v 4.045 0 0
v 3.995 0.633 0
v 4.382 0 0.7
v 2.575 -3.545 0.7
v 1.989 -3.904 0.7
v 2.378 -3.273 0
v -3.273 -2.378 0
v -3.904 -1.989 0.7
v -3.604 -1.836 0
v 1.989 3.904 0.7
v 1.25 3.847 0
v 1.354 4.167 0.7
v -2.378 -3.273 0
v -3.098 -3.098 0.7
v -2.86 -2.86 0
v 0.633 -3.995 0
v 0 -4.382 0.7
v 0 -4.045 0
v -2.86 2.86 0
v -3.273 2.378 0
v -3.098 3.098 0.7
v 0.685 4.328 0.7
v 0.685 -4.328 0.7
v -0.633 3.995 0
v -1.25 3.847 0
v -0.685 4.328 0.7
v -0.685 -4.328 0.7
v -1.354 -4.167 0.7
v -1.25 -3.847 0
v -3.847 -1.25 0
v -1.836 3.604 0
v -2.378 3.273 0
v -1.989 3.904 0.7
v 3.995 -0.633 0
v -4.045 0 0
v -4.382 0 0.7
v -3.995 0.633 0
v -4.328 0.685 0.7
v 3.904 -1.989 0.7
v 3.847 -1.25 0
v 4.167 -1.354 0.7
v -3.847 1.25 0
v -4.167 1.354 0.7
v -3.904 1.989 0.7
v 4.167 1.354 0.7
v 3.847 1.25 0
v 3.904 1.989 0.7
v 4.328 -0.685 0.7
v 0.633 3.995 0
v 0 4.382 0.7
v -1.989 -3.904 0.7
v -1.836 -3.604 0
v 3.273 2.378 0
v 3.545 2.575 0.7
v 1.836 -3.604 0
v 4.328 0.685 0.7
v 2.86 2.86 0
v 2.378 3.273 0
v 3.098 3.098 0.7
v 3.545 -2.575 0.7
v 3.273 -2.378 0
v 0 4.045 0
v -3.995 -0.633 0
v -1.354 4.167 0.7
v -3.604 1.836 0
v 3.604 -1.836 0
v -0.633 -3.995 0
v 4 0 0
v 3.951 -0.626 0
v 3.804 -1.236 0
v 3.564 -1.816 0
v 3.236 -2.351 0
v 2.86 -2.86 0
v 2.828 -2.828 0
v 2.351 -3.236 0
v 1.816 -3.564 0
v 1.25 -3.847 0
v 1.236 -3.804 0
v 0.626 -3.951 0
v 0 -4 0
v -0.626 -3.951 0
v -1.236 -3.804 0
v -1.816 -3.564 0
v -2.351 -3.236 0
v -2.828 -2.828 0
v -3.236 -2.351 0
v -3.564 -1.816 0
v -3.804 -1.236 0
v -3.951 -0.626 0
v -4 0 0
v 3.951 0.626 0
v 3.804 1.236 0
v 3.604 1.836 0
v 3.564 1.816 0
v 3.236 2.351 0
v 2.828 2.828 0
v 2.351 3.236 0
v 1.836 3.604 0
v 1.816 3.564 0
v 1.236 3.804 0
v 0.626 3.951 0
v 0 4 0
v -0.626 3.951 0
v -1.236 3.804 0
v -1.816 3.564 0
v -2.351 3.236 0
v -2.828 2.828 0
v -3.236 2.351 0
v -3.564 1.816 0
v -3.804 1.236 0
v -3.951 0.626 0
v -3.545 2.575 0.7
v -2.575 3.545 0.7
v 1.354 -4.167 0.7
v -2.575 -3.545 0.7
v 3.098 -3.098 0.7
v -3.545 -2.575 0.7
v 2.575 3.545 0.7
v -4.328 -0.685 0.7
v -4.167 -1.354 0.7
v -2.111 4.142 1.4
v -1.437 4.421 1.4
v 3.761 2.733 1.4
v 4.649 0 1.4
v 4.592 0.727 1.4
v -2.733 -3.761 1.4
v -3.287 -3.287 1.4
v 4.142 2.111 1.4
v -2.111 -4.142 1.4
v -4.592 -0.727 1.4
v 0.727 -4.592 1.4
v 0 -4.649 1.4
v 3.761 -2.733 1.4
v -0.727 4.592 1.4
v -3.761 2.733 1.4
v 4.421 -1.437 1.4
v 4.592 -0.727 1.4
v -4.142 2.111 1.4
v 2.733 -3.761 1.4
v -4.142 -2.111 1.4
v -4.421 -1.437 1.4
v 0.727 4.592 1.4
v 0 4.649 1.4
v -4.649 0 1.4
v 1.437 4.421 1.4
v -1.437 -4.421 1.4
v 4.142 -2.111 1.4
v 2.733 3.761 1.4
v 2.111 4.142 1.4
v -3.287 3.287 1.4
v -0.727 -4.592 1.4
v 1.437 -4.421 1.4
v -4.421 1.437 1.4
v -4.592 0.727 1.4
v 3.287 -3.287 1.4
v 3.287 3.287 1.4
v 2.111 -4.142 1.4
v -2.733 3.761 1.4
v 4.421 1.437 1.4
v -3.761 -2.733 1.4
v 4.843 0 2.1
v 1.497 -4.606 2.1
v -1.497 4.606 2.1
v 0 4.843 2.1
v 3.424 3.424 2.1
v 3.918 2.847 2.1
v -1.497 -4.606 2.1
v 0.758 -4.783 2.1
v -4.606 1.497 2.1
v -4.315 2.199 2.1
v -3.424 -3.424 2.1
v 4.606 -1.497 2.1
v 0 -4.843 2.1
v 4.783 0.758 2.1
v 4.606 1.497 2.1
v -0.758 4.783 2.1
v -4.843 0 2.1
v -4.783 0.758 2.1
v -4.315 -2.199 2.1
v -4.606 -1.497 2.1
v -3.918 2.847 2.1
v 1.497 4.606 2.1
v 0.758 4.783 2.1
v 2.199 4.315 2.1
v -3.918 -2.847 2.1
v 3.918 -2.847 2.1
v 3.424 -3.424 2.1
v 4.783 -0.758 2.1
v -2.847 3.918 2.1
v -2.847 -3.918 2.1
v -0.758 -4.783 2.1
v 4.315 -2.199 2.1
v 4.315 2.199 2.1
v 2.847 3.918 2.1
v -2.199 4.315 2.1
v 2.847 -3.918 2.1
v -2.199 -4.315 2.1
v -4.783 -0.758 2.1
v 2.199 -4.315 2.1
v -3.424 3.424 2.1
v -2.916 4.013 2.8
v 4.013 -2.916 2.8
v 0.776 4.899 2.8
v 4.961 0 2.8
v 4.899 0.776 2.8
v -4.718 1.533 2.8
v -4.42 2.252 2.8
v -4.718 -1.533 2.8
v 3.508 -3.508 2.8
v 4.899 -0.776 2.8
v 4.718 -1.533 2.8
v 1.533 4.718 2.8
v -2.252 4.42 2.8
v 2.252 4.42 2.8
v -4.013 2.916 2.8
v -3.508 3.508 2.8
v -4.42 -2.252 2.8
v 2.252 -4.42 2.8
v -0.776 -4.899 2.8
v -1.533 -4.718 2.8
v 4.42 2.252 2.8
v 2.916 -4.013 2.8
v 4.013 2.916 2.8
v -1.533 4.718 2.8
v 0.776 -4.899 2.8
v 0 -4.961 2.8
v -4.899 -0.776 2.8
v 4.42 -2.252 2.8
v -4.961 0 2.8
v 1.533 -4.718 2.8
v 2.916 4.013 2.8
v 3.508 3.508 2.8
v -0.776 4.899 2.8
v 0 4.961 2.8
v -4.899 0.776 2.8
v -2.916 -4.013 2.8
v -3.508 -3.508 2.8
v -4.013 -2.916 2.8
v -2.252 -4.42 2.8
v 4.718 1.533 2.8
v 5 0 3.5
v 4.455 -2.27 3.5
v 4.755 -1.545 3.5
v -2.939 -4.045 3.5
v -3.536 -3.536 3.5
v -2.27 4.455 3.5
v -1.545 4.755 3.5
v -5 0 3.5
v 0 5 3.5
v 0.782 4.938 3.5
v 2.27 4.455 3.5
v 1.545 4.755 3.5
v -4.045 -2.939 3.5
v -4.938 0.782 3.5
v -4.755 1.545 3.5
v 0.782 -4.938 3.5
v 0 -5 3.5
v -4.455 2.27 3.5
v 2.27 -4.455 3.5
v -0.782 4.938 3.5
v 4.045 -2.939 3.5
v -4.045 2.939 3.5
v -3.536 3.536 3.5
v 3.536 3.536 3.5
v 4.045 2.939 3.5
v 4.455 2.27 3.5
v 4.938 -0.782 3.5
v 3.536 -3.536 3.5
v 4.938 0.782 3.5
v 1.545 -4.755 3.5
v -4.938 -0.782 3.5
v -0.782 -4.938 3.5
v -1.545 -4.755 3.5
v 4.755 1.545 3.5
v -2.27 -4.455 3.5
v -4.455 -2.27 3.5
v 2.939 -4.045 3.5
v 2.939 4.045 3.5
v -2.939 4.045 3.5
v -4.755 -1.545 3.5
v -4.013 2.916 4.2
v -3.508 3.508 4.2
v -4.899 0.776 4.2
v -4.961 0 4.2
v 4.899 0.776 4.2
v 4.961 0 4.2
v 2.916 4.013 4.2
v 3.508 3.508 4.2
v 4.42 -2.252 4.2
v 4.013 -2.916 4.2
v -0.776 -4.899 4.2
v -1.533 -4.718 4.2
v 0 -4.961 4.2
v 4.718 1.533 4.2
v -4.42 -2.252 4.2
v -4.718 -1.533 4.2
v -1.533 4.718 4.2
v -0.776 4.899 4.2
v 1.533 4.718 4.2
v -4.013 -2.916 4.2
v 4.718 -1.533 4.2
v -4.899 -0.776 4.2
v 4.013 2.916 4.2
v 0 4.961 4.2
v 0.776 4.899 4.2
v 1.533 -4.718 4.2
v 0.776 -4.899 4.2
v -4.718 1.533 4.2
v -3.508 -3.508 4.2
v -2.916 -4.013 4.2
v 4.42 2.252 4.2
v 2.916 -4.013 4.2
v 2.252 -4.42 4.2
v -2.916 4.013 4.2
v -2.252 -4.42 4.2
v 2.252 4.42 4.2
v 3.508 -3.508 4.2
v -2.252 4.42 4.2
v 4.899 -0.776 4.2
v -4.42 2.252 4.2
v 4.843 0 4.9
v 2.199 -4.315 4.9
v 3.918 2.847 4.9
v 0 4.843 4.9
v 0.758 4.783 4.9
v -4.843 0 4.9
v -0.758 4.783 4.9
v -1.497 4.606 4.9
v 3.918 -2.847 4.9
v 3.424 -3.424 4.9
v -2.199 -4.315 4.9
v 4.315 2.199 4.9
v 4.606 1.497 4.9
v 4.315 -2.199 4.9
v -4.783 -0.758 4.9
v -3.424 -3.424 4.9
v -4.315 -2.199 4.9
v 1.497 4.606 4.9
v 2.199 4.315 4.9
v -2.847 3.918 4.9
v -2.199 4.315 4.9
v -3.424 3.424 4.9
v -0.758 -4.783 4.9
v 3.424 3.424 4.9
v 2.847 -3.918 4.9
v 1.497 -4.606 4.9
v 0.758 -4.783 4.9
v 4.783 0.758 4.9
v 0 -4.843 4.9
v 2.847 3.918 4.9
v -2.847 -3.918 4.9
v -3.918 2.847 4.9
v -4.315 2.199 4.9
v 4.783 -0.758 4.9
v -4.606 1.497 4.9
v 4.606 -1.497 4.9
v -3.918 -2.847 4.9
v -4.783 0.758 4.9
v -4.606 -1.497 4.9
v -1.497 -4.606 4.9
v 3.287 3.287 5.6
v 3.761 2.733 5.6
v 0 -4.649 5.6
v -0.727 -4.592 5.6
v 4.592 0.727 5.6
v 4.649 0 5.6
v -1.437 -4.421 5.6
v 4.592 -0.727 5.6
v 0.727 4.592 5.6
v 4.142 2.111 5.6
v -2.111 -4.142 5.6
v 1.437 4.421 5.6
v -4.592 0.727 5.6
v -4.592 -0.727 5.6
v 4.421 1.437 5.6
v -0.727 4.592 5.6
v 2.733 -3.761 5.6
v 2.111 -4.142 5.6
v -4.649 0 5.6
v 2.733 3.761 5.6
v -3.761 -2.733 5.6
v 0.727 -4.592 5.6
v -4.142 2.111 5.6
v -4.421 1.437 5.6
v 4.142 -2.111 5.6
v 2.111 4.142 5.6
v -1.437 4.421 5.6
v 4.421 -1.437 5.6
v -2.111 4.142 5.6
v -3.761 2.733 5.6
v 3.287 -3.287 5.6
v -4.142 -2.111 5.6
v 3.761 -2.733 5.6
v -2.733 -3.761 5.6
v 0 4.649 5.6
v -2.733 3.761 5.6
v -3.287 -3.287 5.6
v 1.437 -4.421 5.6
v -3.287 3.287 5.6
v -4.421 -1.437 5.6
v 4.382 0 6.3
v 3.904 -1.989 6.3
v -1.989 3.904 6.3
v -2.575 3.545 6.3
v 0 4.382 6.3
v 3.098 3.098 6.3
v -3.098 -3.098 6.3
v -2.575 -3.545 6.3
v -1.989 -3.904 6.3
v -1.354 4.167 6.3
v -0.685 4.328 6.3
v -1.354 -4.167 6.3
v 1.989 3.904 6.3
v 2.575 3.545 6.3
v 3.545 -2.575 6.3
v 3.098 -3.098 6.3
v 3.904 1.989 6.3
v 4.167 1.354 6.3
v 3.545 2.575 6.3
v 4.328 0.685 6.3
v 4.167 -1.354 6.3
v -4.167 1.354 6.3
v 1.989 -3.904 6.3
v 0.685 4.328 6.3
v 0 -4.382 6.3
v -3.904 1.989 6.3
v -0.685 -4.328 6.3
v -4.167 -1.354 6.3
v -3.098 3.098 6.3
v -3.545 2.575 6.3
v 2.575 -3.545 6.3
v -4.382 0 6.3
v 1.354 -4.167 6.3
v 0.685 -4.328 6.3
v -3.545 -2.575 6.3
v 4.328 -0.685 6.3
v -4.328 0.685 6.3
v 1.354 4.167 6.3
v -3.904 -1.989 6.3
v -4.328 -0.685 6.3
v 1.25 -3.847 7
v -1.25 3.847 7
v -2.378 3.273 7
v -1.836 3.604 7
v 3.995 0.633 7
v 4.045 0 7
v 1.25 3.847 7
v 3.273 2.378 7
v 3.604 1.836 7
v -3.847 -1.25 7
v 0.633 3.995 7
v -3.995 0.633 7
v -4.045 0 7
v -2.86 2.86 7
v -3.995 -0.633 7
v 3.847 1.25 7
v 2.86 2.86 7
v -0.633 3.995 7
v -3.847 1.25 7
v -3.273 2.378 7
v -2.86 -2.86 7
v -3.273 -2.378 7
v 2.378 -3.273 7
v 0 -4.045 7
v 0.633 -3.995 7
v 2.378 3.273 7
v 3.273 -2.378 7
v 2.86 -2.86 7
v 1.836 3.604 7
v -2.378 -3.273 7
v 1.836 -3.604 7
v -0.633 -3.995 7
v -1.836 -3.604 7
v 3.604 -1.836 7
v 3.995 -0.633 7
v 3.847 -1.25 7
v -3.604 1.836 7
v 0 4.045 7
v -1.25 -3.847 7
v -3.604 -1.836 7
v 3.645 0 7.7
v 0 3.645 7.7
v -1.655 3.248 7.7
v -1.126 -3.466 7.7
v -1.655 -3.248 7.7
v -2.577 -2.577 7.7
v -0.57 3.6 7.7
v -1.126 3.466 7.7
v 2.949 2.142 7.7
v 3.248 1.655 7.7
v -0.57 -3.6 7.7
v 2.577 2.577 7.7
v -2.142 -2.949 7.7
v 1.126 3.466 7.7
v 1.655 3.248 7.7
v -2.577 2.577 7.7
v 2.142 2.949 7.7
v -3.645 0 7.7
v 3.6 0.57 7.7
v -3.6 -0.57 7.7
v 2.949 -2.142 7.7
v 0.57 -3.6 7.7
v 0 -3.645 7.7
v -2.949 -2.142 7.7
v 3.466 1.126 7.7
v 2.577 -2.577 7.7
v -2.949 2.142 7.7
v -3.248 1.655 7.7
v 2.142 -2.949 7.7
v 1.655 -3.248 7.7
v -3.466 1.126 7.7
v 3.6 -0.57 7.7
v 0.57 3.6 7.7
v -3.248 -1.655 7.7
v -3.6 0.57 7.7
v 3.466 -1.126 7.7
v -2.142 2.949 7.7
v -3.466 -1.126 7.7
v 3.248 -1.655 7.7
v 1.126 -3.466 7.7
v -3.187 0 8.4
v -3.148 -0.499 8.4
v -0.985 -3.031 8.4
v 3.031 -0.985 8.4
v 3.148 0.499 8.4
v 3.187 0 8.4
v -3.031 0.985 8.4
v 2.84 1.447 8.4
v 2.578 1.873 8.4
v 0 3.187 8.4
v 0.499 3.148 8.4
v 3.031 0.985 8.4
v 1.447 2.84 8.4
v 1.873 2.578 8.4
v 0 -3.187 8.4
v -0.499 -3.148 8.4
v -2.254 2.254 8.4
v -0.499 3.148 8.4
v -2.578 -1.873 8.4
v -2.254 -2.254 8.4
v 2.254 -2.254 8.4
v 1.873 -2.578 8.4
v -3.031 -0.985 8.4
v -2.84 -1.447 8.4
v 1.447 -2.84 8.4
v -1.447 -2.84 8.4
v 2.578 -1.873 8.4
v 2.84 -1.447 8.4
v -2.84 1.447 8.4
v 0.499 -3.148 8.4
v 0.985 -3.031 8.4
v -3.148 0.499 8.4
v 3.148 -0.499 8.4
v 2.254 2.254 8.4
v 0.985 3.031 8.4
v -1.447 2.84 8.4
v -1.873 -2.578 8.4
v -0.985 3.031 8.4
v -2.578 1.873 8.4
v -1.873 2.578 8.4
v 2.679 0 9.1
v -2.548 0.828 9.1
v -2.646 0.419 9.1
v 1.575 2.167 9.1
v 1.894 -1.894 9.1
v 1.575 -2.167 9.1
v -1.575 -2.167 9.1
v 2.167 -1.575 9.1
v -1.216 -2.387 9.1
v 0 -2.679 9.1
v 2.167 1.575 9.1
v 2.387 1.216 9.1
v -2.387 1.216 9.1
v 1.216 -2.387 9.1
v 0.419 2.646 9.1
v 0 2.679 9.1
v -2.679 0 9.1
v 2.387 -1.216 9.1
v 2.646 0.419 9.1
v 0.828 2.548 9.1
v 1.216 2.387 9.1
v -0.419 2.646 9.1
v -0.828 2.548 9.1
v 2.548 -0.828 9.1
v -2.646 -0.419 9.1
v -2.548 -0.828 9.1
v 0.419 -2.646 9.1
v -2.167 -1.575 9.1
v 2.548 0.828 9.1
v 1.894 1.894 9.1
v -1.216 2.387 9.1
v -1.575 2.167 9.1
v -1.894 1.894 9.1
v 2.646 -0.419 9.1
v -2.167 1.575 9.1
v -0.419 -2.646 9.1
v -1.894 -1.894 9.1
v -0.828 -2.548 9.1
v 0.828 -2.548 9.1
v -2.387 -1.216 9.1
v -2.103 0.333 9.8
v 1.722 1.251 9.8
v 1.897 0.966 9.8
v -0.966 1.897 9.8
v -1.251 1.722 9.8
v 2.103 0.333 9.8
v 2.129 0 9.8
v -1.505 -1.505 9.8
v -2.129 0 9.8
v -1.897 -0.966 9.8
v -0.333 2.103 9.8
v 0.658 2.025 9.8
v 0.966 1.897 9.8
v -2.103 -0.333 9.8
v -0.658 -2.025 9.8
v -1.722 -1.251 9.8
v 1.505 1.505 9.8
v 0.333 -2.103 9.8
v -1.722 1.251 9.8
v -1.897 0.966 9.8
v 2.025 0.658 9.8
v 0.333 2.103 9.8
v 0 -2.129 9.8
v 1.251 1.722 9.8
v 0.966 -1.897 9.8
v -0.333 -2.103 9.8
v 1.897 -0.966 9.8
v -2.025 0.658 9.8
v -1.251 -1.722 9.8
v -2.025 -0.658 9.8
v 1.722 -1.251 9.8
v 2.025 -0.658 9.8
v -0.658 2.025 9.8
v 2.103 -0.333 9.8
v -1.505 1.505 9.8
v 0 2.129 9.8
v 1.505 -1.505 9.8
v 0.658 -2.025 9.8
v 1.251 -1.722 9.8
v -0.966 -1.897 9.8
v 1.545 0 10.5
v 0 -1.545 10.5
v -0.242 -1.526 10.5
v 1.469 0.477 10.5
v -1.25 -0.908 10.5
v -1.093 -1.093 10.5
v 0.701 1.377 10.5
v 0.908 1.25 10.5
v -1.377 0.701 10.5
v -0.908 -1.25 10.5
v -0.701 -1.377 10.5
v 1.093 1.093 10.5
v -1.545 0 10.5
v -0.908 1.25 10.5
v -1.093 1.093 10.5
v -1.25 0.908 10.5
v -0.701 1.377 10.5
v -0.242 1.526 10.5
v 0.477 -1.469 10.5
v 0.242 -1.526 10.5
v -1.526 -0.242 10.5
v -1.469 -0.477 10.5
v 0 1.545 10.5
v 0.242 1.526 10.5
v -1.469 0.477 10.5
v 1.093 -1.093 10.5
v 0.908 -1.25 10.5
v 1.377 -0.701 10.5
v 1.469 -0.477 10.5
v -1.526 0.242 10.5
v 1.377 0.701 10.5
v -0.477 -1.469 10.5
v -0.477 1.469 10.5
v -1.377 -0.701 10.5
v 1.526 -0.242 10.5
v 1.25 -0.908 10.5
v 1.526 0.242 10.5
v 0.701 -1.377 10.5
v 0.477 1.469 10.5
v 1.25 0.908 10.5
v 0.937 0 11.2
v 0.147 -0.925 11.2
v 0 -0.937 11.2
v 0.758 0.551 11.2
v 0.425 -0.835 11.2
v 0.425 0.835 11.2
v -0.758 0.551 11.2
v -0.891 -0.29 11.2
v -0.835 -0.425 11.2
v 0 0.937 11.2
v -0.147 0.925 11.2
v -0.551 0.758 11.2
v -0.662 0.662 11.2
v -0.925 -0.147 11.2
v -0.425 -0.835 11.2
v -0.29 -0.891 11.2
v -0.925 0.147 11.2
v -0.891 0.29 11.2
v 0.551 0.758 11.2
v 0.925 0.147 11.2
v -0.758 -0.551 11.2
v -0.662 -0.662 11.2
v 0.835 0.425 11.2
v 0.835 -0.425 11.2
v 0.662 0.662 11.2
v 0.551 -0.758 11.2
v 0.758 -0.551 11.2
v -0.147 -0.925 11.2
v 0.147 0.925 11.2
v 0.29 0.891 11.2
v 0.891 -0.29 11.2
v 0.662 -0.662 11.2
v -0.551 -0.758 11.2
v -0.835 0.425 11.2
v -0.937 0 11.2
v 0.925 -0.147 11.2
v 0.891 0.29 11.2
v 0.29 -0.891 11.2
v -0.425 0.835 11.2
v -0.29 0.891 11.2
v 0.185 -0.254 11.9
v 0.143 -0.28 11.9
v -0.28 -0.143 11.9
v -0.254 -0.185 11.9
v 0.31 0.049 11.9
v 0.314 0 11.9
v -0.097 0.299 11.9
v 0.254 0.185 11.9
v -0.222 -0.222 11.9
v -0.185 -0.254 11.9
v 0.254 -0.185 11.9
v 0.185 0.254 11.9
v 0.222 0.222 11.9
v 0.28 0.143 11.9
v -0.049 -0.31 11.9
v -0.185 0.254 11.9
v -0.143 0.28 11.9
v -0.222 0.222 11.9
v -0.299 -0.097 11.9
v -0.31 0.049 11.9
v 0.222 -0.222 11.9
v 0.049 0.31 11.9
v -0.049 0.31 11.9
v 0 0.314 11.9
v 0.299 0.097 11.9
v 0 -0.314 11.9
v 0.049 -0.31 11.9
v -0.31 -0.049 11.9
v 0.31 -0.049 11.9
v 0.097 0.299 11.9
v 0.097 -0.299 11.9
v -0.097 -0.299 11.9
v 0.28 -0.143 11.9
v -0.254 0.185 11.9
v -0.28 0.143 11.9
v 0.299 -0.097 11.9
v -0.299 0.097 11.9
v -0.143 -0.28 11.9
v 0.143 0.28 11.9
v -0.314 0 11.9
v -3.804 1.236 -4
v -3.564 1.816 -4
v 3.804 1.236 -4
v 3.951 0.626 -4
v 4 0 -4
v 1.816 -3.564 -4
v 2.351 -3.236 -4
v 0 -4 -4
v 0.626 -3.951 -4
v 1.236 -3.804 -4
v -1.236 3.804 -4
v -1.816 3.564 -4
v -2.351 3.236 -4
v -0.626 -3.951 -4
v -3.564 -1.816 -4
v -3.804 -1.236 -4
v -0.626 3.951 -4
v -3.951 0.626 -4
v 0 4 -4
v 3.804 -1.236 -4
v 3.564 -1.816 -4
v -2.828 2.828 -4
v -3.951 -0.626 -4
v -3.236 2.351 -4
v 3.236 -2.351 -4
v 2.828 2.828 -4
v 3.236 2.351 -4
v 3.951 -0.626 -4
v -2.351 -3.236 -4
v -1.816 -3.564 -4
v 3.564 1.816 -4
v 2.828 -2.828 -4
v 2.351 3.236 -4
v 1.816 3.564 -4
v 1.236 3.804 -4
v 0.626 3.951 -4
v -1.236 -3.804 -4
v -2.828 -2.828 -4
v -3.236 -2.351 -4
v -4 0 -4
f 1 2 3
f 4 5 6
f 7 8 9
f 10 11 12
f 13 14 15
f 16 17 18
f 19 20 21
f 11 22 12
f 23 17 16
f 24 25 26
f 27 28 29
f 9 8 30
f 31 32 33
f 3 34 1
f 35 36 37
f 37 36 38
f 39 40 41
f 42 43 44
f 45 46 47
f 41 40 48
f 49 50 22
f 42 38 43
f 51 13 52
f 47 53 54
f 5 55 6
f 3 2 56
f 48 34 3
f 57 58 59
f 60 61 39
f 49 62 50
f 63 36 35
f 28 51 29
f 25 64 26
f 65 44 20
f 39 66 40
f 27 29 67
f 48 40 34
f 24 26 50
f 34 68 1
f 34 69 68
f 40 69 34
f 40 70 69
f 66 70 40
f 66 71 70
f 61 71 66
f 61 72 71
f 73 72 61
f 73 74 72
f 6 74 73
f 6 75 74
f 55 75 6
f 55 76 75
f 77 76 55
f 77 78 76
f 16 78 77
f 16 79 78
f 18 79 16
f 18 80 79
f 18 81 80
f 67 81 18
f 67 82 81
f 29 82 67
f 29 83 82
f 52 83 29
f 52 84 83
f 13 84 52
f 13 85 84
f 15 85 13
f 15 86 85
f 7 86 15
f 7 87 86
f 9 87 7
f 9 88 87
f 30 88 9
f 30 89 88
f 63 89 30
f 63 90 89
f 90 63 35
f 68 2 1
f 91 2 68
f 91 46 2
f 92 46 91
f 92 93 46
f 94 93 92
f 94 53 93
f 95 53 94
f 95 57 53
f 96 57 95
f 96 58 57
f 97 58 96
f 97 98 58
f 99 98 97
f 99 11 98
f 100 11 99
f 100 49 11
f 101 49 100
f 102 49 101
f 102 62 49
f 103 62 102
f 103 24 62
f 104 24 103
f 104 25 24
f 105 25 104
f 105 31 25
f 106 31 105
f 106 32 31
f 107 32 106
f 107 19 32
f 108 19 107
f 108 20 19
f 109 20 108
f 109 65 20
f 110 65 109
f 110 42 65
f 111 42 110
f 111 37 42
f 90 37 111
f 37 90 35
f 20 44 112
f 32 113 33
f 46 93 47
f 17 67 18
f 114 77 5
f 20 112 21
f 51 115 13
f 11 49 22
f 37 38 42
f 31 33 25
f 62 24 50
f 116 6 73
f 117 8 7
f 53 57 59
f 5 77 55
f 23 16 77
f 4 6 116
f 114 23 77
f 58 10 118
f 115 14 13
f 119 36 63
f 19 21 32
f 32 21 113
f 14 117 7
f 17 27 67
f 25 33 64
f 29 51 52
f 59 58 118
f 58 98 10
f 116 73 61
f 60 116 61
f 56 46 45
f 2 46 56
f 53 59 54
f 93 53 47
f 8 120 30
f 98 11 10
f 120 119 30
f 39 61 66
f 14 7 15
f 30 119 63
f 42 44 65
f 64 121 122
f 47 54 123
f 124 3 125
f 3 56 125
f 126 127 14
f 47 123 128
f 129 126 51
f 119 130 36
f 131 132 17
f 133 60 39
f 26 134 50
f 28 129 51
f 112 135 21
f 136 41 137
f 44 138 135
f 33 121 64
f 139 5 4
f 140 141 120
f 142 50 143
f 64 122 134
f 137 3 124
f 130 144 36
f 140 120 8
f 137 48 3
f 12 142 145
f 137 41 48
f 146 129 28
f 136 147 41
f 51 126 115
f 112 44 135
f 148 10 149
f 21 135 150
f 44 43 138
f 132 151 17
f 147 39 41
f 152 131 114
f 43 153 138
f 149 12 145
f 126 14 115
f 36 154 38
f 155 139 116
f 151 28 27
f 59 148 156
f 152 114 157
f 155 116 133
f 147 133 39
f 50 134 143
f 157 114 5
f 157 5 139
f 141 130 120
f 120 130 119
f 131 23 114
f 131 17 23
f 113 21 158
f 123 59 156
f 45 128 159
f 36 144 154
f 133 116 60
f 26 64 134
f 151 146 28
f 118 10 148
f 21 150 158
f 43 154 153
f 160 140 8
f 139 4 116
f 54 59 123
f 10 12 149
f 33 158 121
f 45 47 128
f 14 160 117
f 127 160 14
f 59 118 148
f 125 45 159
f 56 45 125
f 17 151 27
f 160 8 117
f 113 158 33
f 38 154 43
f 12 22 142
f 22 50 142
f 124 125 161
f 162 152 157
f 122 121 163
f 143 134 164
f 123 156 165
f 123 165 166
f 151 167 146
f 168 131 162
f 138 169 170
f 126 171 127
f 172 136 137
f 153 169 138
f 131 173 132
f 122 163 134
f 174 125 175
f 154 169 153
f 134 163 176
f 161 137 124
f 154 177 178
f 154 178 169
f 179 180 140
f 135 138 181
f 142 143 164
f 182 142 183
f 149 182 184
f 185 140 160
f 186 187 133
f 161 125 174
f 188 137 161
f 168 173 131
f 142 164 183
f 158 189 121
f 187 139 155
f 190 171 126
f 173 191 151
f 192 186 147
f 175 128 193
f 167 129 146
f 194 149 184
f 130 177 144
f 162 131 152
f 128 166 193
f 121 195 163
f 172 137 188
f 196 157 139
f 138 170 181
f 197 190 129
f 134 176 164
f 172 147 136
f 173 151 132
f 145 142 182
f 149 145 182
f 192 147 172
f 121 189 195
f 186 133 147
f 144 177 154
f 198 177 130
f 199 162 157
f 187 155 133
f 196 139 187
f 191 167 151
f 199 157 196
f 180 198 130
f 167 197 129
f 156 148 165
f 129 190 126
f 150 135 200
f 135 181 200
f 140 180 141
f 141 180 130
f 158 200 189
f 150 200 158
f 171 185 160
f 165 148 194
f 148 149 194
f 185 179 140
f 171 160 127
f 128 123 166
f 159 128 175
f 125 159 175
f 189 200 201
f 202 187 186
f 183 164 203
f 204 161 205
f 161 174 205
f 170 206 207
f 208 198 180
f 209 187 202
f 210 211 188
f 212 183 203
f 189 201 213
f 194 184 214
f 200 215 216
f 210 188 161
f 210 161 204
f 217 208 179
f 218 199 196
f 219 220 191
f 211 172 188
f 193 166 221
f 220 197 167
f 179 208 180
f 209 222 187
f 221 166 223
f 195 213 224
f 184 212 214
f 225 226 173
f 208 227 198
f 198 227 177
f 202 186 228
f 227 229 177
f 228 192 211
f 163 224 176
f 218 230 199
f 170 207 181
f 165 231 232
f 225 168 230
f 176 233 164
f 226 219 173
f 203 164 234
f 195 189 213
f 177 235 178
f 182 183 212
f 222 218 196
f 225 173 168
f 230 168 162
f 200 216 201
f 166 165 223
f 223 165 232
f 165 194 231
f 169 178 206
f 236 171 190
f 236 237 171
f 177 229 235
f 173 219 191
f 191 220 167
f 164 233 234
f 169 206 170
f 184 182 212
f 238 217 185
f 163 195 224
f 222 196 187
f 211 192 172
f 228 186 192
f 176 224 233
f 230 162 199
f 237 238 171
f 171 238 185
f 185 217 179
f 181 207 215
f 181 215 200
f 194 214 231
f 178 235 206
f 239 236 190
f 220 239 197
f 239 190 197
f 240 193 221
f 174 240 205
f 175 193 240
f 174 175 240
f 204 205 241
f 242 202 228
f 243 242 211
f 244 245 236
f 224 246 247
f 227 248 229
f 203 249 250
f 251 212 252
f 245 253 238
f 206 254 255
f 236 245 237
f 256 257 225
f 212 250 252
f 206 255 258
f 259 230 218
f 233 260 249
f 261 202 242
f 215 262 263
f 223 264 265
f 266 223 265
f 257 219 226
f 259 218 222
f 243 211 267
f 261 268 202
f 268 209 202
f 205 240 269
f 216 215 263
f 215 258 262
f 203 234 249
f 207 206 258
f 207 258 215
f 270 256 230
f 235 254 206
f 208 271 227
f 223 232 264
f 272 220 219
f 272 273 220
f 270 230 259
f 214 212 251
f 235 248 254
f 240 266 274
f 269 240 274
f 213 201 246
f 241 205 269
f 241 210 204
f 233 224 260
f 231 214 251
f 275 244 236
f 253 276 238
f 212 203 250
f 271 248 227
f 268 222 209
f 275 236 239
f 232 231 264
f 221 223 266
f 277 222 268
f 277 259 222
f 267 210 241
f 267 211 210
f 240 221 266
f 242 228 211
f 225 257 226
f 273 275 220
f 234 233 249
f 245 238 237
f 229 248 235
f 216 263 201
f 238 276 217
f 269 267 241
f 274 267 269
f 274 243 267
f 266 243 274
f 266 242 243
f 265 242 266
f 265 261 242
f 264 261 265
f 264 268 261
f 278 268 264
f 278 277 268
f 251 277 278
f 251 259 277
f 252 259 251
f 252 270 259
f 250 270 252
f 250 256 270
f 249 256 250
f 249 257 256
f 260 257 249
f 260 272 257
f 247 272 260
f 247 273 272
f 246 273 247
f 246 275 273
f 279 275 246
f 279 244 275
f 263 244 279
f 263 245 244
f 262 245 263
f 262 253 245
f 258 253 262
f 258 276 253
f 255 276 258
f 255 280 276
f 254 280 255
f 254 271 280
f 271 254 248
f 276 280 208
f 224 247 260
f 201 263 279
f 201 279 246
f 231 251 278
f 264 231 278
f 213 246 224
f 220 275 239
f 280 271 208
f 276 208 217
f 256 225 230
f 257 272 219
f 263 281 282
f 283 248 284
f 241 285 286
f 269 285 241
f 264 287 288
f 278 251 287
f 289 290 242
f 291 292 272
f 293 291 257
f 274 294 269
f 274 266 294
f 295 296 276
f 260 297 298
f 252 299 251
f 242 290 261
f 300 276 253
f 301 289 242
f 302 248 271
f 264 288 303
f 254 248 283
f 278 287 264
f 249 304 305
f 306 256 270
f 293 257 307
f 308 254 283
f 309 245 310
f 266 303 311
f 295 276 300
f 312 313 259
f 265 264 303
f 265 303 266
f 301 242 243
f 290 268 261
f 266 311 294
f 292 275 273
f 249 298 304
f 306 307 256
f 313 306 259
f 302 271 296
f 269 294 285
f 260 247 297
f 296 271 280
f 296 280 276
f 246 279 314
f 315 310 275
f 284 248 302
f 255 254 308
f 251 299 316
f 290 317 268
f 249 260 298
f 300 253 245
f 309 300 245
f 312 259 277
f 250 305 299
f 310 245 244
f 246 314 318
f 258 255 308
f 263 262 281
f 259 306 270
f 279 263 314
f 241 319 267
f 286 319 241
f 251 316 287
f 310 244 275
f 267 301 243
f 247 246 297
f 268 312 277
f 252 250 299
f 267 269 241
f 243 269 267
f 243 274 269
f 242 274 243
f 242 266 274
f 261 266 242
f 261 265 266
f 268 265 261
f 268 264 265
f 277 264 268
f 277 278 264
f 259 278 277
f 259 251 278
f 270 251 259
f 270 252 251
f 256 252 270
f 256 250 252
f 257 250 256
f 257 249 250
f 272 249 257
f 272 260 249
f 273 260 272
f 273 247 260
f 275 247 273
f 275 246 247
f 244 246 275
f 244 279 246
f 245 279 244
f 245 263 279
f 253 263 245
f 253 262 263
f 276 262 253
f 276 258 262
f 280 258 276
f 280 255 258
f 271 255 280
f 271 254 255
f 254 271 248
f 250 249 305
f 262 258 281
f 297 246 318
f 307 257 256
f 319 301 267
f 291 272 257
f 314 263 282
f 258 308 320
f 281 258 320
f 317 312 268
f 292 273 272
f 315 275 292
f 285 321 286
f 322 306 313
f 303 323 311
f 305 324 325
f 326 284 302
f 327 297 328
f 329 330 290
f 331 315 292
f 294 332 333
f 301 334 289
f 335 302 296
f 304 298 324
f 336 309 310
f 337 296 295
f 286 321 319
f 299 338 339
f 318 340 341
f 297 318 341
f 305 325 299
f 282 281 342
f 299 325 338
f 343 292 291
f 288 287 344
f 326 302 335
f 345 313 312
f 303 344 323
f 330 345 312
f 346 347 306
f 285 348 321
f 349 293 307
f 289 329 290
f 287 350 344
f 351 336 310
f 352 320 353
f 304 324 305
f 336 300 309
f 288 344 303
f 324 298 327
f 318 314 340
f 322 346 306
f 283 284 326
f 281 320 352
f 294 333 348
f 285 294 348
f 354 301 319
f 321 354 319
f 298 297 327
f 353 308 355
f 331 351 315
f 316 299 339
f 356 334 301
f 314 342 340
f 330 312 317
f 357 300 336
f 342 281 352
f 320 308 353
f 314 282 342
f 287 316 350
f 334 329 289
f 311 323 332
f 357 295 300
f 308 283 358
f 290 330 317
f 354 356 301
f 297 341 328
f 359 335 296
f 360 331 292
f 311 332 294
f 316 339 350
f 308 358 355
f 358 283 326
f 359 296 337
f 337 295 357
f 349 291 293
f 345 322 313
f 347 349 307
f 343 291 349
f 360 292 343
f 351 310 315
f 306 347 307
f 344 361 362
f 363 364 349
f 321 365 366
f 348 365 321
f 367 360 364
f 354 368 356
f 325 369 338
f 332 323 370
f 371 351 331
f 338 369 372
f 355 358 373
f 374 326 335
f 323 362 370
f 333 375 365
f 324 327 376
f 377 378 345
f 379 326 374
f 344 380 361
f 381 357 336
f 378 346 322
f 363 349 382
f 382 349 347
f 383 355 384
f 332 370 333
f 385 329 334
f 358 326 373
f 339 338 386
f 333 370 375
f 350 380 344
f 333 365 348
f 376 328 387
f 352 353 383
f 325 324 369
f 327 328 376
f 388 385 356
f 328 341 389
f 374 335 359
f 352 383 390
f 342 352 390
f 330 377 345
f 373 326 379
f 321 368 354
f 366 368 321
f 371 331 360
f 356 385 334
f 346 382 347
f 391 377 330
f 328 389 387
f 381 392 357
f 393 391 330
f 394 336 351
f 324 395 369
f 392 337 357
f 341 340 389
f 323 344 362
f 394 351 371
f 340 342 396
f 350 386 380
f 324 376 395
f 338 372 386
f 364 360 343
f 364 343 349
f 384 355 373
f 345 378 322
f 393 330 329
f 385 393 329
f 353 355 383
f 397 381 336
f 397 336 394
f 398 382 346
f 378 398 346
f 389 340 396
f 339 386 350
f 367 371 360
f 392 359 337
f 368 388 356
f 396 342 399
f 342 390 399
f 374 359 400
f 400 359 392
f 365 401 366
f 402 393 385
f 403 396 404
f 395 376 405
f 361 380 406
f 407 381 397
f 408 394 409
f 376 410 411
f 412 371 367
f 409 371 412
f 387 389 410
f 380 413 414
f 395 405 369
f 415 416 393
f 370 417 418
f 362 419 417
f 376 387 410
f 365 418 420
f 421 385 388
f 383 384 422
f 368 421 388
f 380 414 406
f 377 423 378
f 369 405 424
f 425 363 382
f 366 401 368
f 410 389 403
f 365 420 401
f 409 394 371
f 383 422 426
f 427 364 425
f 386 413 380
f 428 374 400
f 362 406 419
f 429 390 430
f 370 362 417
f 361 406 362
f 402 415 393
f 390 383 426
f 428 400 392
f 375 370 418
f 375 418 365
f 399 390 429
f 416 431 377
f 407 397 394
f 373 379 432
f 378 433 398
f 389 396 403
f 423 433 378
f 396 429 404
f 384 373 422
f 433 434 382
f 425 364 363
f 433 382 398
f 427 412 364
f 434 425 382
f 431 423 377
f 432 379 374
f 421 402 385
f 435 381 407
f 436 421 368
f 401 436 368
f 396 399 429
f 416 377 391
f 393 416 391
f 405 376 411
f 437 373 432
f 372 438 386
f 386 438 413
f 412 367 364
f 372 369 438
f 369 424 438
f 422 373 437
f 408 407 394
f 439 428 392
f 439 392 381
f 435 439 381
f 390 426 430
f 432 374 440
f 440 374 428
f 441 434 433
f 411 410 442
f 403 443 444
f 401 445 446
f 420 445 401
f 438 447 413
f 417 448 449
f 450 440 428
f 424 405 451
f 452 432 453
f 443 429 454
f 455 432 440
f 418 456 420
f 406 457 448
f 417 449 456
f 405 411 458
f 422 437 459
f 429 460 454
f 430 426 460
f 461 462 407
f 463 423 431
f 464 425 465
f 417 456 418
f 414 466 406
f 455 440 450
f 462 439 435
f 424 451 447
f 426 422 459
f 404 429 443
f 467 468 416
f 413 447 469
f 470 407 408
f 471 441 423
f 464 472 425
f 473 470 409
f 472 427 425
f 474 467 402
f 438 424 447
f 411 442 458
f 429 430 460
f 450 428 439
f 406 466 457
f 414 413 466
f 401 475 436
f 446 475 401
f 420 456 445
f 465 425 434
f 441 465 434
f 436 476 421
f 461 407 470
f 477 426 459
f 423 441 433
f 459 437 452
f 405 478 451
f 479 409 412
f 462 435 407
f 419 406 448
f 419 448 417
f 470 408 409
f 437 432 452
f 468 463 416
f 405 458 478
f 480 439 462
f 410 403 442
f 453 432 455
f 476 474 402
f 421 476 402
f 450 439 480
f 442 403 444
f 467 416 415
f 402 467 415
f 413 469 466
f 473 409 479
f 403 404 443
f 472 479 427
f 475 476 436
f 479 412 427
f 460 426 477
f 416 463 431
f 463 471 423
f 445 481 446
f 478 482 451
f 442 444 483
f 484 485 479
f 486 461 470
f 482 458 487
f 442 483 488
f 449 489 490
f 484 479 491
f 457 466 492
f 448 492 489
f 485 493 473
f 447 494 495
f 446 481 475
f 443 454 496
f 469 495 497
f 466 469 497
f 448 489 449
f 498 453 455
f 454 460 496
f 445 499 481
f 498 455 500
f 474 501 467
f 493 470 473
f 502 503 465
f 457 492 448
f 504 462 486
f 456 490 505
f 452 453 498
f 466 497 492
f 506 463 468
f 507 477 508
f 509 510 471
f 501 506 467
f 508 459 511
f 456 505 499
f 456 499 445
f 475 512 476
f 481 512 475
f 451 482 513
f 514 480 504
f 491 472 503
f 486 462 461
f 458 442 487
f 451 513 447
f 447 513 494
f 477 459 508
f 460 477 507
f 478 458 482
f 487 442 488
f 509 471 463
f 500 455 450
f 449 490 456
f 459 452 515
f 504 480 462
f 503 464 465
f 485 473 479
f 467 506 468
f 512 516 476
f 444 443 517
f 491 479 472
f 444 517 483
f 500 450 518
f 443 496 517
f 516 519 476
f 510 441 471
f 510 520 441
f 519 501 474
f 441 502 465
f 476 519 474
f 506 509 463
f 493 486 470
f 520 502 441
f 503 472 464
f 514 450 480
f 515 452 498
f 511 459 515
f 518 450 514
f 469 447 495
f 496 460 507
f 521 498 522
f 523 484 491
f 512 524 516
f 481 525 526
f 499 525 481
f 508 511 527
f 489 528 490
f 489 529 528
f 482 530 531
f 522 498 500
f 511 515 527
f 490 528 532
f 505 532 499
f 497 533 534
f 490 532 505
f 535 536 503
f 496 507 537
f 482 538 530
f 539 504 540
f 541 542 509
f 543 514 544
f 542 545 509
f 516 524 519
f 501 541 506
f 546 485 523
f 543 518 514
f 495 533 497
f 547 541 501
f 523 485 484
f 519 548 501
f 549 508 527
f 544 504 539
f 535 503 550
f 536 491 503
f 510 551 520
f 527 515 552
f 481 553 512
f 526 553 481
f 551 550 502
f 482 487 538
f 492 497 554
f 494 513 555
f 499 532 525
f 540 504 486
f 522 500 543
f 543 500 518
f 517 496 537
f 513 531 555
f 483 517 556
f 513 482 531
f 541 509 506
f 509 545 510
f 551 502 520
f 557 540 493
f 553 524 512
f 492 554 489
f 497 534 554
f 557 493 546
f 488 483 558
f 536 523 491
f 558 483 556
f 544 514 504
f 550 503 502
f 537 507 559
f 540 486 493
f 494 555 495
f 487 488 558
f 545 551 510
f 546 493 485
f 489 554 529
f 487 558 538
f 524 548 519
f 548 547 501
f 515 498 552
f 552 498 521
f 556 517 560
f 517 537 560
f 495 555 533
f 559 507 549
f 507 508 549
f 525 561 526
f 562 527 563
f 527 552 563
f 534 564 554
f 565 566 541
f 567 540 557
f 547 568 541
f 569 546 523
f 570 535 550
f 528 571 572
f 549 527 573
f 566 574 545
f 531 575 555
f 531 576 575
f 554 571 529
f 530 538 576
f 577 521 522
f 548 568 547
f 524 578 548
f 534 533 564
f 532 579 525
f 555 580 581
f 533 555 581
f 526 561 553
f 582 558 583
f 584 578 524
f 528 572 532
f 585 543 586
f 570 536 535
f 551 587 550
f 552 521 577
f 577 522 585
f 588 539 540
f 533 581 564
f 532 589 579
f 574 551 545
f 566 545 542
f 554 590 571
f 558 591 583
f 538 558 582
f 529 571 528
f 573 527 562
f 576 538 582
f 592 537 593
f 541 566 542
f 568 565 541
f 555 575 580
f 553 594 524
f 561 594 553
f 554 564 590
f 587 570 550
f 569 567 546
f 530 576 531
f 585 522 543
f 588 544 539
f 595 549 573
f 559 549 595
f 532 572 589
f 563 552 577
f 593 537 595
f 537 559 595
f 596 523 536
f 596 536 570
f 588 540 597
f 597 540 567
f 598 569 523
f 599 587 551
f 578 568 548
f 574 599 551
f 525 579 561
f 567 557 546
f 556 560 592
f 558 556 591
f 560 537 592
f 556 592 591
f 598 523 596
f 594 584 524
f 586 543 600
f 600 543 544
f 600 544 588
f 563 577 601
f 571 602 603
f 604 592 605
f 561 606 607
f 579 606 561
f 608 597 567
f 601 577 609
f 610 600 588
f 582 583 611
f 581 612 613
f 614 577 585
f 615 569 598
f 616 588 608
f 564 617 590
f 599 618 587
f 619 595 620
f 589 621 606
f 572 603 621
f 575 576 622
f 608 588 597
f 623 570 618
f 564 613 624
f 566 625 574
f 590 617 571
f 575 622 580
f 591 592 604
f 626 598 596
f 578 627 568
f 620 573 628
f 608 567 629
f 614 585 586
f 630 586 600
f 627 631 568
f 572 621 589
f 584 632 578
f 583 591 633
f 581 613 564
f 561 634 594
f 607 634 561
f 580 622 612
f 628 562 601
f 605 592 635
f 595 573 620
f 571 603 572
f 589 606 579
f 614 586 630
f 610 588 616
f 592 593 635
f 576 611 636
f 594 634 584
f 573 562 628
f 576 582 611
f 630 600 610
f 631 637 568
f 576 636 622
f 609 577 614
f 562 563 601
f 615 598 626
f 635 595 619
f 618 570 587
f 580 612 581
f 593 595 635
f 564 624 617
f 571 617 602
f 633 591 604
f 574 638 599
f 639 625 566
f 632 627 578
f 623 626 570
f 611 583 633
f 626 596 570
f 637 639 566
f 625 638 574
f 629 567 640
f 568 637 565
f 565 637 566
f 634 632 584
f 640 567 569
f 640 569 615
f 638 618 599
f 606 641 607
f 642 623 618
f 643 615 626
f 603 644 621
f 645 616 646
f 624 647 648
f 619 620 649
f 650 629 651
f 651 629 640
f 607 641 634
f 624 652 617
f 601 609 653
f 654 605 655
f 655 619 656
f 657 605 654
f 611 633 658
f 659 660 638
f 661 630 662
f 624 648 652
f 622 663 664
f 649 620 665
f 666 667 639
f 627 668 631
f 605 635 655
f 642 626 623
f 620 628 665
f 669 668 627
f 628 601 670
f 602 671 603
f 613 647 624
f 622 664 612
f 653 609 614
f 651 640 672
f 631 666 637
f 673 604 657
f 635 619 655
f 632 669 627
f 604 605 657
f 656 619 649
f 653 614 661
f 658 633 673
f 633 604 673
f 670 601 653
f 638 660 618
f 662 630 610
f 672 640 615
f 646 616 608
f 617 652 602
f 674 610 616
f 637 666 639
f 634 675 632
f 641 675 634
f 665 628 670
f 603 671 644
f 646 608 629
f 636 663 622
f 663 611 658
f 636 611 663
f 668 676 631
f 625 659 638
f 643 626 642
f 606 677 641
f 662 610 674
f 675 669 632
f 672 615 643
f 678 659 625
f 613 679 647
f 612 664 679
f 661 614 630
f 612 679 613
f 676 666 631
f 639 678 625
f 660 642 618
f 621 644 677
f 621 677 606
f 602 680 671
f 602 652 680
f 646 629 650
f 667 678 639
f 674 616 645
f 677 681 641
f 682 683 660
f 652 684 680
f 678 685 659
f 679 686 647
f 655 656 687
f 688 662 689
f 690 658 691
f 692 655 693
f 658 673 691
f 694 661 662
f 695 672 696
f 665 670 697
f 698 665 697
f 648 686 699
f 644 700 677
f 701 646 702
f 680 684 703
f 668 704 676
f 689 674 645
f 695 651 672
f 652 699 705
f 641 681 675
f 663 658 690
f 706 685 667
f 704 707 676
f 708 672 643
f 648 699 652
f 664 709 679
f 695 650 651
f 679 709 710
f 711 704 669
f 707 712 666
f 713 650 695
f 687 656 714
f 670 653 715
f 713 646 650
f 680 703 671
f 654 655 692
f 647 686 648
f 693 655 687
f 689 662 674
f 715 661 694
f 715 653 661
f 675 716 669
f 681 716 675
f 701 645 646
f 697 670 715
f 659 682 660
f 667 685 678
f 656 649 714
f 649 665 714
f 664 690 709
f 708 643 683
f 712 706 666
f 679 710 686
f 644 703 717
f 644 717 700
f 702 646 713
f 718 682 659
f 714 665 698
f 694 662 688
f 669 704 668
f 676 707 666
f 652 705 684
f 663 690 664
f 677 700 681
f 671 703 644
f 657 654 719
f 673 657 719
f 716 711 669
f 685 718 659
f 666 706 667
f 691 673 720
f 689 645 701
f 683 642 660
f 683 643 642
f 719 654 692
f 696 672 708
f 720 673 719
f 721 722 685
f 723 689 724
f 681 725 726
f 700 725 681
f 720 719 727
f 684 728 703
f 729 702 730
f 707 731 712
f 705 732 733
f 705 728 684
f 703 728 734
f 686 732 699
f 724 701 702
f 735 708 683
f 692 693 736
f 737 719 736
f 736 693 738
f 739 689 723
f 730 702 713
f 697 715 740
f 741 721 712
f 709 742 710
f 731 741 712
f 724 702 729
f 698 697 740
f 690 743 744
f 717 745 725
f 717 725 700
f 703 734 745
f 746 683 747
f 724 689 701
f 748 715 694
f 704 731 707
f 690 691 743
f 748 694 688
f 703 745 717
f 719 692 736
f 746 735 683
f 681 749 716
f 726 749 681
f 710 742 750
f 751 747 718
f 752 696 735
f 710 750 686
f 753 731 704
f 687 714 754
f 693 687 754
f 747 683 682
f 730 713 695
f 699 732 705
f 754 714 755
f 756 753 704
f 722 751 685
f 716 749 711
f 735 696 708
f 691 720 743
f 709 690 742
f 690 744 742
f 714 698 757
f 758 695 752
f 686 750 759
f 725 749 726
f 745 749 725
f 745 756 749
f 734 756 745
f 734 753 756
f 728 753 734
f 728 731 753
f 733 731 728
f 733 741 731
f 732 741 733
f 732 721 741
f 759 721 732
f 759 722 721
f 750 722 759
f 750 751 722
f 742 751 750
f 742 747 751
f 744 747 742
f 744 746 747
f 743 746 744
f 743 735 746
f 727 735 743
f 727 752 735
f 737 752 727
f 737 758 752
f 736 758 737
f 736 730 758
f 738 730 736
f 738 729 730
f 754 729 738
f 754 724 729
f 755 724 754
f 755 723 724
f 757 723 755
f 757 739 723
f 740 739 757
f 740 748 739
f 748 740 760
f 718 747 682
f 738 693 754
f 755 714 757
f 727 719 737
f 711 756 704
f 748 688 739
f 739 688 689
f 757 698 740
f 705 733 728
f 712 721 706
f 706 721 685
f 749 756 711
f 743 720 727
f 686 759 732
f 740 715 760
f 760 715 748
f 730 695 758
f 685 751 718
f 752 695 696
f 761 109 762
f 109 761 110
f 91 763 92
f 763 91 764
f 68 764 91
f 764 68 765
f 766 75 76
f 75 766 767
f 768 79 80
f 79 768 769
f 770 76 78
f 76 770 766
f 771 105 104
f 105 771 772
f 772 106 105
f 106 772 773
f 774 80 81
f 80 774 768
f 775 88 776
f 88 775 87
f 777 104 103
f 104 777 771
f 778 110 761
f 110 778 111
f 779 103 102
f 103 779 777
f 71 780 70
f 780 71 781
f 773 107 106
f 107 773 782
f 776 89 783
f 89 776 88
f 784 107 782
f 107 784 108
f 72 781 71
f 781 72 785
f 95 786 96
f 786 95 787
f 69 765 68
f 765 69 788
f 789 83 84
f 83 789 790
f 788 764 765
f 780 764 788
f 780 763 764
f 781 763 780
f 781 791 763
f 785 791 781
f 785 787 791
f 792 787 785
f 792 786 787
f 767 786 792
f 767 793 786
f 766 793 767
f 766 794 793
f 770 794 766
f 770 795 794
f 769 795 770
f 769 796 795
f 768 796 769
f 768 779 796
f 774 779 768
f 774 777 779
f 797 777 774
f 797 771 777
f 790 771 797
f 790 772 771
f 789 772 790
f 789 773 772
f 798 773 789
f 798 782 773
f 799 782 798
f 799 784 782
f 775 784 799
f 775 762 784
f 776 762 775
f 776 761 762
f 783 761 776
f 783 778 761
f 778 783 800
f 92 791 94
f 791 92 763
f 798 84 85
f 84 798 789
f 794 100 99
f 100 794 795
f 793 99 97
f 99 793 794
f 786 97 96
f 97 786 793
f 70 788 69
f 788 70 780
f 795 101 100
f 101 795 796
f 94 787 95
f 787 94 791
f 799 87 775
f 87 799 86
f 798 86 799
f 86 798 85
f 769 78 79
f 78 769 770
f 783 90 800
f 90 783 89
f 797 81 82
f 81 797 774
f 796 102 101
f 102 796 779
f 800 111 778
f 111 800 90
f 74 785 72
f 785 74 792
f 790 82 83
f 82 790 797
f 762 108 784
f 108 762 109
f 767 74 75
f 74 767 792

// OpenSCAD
$fn = 40;
STEPSIZE = 0.04;
PI = 180;
SIZE = 0.5;

scale([SIZE*10,SIZE*10,SIZE*35]){
    translate([0,0,-0.3]){
        for( i = [0.3:STEPSIZE:1-STEPSIZE]){
            translate([0,0,i]){
                cylinder(STEPSIZE,sin(i*PI),sin((i+STEPSIZE)*PI));
            }
        }
    }
}
translate([0,0,-4]){
    cylinder(4,4,4);
}
